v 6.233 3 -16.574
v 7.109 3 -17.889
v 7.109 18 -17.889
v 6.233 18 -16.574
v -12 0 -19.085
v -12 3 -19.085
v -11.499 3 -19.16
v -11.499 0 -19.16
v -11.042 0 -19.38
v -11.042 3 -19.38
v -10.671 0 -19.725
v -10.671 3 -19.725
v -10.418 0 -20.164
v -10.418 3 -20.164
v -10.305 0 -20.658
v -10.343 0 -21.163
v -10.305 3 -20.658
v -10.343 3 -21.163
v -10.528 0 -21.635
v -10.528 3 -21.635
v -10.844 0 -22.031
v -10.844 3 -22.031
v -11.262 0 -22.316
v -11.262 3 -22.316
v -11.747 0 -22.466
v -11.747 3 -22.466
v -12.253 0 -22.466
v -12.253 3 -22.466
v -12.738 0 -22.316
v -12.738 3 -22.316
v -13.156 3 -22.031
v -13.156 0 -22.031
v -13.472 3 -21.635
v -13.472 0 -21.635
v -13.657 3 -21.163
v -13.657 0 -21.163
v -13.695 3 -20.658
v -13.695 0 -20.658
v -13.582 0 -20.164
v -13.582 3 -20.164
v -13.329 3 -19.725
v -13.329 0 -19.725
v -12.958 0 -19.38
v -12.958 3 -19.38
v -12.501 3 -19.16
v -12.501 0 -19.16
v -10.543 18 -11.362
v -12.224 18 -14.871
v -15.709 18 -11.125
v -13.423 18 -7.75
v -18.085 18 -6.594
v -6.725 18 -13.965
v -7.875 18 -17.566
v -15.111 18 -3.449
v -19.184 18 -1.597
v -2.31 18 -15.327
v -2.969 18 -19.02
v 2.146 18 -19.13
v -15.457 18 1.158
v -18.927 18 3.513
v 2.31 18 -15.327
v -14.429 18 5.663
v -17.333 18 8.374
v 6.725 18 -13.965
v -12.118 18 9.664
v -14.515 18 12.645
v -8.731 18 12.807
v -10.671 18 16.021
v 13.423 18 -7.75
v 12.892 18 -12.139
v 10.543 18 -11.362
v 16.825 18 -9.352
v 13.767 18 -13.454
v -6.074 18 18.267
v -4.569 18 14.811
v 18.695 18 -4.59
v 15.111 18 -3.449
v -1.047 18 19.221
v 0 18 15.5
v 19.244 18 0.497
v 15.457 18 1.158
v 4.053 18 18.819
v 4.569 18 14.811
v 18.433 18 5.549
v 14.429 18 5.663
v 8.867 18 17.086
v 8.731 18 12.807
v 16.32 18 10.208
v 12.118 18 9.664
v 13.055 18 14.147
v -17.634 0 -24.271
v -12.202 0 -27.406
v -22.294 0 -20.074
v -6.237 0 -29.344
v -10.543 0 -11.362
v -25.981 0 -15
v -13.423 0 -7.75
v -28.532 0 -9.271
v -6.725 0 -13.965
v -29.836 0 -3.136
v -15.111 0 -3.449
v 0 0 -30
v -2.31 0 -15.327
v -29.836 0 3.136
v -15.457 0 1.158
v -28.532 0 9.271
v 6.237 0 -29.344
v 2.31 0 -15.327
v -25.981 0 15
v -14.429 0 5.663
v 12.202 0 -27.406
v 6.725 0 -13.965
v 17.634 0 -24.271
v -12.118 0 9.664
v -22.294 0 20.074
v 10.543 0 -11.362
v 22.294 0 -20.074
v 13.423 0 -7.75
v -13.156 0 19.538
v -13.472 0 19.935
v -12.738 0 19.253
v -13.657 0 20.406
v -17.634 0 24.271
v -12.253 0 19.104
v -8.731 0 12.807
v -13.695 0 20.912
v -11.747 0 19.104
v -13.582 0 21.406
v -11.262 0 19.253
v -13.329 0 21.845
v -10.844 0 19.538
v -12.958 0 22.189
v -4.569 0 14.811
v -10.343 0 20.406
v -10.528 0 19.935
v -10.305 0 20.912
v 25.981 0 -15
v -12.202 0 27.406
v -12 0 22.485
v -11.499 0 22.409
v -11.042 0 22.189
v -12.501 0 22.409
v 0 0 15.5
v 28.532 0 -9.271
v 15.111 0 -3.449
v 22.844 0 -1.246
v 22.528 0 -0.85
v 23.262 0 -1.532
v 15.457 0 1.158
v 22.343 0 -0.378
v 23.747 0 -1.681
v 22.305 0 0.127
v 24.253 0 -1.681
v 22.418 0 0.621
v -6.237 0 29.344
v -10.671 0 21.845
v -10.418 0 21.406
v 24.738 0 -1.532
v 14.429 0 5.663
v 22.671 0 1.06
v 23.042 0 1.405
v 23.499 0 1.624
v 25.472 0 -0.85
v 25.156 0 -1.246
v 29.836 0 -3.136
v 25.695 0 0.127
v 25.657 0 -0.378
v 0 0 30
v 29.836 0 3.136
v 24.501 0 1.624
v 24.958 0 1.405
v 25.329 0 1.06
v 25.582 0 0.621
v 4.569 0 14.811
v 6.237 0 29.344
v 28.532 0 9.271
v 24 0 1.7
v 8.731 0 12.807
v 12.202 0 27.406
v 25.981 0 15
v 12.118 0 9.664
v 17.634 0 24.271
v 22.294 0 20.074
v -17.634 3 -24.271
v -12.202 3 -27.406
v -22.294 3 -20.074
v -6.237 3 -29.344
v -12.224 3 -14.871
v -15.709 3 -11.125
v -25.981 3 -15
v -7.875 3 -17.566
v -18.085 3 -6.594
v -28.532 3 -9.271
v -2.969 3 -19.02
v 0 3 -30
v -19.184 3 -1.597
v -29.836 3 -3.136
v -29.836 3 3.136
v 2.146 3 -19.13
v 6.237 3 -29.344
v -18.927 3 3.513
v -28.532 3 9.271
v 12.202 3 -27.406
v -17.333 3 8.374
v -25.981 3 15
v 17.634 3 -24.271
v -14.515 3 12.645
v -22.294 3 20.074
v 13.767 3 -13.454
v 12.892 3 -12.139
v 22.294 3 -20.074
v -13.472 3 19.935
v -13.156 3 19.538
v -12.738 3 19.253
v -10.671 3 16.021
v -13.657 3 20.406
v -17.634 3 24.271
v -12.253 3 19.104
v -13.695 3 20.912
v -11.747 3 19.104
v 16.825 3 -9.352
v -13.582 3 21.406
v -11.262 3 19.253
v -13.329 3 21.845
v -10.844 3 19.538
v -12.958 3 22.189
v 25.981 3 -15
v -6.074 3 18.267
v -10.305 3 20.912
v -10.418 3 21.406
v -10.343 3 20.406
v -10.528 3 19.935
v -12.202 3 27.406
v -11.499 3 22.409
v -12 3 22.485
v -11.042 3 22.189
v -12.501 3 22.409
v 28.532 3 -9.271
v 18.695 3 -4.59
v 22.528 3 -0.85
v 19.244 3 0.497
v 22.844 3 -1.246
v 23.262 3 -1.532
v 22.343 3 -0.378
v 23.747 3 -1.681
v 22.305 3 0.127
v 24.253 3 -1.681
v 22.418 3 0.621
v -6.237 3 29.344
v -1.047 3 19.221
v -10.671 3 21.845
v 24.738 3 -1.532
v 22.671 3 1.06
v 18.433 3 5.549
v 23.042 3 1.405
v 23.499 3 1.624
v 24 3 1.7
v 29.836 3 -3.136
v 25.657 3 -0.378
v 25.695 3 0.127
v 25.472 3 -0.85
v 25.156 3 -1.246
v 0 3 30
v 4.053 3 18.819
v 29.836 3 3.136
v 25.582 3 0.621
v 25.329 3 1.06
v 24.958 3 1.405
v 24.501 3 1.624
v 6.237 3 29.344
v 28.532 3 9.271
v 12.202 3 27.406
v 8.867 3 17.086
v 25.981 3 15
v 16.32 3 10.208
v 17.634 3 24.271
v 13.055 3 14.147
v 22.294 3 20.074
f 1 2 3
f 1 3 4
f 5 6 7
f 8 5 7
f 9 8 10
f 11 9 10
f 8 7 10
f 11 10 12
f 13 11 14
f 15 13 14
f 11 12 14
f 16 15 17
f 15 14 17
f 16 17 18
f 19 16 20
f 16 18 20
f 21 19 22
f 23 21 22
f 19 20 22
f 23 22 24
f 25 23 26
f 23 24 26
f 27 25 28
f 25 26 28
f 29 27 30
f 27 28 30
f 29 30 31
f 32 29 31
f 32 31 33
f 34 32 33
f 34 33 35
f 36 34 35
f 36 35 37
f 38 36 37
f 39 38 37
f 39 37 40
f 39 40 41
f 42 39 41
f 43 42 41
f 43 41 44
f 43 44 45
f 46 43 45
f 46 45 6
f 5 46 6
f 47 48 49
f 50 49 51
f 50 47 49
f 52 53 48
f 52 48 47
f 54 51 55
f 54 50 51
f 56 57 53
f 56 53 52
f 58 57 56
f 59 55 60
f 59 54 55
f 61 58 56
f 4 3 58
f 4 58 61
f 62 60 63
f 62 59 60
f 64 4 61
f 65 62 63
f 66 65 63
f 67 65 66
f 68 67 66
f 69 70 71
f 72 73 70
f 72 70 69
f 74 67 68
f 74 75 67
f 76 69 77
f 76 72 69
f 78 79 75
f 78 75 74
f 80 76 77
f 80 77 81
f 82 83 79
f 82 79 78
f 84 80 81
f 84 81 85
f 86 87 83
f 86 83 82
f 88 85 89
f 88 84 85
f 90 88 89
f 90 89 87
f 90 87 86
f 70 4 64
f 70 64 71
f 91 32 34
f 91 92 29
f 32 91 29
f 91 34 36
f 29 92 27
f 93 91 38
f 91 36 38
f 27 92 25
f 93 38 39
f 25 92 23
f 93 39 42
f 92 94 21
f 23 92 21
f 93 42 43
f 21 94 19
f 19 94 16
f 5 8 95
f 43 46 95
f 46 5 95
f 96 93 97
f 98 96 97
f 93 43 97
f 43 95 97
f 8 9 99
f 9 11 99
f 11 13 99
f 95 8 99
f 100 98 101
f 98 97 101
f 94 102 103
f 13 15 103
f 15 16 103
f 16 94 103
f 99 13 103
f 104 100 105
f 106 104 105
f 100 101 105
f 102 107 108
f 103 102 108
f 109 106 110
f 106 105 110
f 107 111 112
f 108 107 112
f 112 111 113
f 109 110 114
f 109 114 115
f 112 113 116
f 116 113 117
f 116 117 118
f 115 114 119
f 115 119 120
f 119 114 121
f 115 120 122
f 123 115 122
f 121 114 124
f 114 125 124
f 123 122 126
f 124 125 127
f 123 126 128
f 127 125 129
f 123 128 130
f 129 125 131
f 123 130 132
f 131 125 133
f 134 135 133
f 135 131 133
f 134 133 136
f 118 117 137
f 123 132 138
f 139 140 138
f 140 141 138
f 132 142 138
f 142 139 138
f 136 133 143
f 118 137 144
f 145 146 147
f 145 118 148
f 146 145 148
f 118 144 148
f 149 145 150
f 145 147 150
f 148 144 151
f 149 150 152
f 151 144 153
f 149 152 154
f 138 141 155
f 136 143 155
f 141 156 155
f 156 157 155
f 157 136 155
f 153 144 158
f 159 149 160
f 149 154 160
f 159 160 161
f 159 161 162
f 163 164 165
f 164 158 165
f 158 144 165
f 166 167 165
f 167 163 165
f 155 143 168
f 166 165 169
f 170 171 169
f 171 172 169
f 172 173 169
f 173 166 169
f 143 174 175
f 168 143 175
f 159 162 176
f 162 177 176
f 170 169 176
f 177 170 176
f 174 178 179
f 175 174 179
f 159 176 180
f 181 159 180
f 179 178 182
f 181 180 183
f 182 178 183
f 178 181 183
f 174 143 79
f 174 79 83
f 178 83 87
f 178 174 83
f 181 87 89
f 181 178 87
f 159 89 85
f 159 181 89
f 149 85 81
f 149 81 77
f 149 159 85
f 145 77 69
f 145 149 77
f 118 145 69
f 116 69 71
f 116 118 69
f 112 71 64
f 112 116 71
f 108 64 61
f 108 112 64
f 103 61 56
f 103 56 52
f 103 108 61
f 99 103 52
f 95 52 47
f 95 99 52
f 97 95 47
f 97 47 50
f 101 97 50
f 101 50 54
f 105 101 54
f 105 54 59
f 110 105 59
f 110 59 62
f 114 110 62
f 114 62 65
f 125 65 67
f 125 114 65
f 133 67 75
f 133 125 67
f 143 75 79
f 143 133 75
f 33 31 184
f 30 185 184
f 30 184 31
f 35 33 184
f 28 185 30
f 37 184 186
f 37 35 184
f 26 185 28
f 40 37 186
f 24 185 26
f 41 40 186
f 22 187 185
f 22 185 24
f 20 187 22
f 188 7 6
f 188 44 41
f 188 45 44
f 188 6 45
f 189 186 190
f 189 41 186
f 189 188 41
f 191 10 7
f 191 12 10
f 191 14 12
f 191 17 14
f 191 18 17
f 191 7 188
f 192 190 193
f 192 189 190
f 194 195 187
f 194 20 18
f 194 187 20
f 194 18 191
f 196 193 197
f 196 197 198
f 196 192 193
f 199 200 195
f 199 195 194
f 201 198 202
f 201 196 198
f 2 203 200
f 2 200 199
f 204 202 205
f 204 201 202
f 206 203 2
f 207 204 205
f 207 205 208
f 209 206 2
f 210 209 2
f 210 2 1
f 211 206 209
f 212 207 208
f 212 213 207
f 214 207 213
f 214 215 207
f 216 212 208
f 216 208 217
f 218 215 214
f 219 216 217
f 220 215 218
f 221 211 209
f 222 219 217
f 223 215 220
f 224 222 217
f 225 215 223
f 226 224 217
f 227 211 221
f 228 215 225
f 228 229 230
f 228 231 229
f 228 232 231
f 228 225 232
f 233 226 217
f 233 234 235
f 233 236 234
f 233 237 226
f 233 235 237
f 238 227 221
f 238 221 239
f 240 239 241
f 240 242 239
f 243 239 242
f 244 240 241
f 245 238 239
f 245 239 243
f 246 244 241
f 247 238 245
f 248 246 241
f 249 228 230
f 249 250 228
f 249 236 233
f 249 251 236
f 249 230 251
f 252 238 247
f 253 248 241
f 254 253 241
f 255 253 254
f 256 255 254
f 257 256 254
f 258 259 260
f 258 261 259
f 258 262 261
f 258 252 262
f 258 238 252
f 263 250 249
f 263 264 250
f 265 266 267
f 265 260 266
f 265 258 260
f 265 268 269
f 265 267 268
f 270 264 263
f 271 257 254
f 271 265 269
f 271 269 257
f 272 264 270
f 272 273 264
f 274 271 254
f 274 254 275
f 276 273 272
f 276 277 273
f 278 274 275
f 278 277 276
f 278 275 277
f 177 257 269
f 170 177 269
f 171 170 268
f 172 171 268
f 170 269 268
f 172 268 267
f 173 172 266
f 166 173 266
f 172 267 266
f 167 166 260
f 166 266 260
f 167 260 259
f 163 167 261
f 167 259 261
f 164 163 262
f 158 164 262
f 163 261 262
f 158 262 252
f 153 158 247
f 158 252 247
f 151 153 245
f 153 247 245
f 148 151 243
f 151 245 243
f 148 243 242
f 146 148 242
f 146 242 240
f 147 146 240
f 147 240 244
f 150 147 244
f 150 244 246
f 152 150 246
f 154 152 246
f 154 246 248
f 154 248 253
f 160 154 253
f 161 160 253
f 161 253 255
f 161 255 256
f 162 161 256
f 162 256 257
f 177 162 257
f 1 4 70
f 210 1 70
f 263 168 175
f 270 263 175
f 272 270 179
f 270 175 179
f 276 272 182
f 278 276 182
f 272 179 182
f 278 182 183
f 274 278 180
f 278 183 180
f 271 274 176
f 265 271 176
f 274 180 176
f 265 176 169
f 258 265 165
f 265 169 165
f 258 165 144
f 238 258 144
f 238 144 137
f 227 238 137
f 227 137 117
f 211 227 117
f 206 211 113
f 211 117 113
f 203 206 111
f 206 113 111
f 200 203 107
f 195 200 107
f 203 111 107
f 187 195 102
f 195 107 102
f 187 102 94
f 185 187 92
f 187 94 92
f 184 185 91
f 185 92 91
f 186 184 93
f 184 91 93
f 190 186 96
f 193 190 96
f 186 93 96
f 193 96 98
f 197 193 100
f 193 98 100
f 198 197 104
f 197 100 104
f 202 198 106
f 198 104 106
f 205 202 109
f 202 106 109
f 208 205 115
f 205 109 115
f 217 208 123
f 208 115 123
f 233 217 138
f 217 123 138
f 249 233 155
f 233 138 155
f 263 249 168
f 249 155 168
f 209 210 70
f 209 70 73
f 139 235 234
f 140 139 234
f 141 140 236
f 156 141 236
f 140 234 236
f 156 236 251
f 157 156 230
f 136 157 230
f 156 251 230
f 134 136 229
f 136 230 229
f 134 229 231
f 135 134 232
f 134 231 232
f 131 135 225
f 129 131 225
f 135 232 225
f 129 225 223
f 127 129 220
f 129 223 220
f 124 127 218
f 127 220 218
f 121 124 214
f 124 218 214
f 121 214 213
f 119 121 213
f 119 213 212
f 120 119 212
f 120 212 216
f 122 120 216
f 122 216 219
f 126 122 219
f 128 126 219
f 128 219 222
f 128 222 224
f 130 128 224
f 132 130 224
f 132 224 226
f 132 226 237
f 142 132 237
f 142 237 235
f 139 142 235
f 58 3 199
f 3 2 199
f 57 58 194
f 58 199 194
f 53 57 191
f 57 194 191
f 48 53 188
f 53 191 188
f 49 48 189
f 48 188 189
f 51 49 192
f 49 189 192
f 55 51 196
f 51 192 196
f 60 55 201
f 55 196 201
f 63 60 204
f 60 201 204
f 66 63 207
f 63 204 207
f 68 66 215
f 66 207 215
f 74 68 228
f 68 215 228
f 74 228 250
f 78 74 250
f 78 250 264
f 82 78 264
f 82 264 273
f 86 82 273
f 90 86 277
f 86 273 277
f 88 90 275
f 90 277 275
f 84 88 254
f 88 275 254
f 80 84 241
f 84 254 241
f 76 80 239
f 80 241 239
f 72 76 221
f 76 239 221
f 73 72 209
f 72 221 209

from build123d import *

# Parameters (mm, degrees)
SKETCH2_R          = 30
SKETCH2_R_2        = 19.25
FLANG_DEPTH        = 3
SKETCH2_3_R        = 19.25
SKETCH2_3_R_2      = 15.5
SKIRT_DEPTH        = 18
SKETCH3_R          = 1.7
HOLES_BOLTS_DEPTH  = 46
SERVICE_SLOT_DEPTH = 46


with BuildPart() as part:
    # Sketch2 → flang (new body)
    with BuildSketch(Plane(origin=(0, 0, 0), x_dir=(1, 0, 0), z_dir=(0, 1, 0))):
        Circle(SKETCH2_R)
        Circle(SKETCH2_R_2, mode=Mode.SUBTRACT)
    extrude(amount=FLANG_DEPTH)

    # Sketch2<3> → skirt (add)
    with BuildSketch(Plane(origin=(0, 0, 0), x_dir=(1, 0, 0), z_dir=(0, 1, 0))):
        Circle(SKETCH2_3_R)
        Circle(SKETCH2_3_R_2, mode=Mode.SUBTRACT)
    extrude(amount=SKIRT_DEPTH)

    # Sketch3 → holes_bolts (cut, through all)
    with BuildSketch(Plane(origin=(0, 3, 0), x_dir=(1, 0, 0), z_dir=(0, 1, 0))):
        with Locations((24, 0)):
            Circle(SKETCH3_R)
        with Locations((-12, -20.784609691)):
            Circle(SKETCH3_R)
        with Locations((-12, 20.784609691)):
            Circle(SKETCH3_R)
    extrude(amount=-HOLES_BOLTS_DEPTH, mode=Mode.SUBTRACT)

    # Sketch8 → service_slot (cut, through all)
    with BuildSketch(Plane(origin=(0, 3, 0), x_dir=(1, 0, 0), z_dir=(0, 1, 0))):
        Polygon((14.000367572, 13.804064903), (7.342096898, 18.238862715), (6.233397445, 16.574295047), (12.891668119, 12.139497235), align=None)
    extrude(amount=SERVICE_SLOT_DEPTH, mode=Mode.SUBTRACT)


solid = part.part
